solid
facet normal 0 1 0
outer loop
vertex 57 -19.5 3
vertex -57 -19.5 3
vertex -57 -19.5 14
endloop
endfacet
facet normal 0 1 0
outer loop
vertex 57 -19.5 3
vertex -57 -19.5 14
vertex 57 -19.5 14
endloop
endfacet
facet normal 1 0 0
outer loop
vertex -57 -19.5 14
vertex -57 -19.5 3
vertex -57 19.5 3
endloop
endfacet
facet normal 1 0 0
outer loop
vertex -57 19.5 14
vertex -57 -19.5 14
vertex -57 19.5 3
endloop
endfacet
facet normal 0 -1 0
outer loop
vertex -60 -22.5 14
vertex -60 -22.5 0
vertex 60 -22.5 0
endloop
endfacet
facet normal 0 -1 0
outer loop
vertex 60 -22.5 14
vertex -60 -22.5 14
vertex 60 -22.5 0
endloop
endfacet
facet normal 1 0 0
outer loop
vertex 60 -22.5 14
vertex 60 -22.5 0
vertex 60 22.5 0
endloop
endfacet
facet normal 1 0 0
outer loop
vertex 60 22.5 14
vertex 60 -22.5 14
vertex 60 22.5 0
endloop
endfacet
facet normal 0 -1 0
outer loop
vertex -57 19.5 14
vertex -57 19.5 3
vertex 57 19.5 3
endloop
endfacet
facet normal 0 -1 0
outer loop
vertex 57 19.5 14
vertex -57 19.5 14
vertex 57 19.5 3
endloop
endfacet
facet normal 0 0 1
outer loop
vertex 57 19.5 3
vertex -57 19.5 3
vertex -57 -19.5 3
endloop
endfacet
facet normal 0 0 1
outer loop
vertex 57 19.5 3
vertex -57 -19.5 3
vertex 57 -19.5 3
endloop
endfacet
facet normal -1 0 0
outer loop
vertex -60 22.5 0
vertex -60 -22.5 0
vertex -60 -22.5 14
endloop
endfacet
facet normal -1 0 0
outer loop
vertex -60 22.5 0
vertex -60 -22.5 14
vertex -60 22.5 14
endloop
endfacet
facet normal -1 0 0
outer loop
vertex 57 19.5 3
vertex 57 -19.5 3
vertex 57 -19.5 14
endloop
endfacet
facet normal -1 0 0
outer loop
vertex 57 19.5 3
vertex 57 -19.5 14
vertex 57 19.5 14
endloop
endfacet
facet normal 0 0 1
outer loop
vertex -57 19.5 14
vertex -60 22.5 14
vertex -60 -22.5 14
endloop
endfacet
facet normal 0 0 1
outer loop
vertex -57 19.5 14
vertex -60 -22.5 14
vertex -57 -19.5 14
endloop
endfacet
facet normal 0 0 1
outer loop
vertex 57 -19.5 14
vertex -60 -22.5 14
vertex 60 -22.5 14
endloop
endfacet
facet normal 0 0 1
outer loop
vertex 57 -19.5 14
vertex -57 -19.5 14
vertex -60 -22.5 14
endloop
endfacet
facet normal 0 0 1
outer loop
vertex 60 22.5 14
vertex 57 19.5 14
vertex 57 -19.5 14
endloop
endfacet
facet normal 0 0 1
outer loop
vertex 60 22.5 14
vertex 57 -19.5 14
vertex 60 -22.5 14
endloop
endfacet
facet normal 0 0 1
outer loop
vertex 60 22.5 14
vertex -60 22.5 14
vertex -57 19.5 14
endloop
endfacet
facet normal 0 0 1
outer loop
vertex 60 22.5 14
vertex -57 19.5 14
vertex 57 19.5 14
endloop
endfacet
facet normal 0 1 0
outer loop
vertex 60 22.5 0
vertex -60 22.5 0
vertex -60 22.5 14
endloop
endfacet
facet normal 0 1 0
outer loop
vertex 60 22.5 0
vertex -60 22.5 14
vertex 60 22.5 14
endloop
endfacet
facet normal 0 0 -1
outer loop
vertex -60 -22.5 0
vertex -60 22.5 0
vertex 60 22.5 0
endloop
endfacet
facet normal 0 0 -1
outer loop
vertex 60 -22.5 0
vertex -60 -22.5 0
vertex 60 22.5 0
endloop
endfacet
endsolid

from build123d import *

# Parameters (mm, degrees)
SKETCH2_W           = 120
SKETCH2_H           = 45
BOSS_EXTRUDE2_DEPTH = 14
SHELL1_T            = -3


with BuildPart() as part:
    # Sketch2 → Boss-Extrude2 (new body)
    with BuildSketch(Plane.XY):
        Rectangle(SKETCH2_W, SKETCH2_H)
    extrude(amount=BOSS_EXTRUDE2_DEPTH)

    # Shell1
    shell1_openings = [part.faces().sort_by_distance(p)[0] for p in [
        (0, 0, 14),
    ]]
    offset(amount=SHELL1_T, openings=shell1_openings, kind=Kind.INTERSECTION)


solid = part.part
